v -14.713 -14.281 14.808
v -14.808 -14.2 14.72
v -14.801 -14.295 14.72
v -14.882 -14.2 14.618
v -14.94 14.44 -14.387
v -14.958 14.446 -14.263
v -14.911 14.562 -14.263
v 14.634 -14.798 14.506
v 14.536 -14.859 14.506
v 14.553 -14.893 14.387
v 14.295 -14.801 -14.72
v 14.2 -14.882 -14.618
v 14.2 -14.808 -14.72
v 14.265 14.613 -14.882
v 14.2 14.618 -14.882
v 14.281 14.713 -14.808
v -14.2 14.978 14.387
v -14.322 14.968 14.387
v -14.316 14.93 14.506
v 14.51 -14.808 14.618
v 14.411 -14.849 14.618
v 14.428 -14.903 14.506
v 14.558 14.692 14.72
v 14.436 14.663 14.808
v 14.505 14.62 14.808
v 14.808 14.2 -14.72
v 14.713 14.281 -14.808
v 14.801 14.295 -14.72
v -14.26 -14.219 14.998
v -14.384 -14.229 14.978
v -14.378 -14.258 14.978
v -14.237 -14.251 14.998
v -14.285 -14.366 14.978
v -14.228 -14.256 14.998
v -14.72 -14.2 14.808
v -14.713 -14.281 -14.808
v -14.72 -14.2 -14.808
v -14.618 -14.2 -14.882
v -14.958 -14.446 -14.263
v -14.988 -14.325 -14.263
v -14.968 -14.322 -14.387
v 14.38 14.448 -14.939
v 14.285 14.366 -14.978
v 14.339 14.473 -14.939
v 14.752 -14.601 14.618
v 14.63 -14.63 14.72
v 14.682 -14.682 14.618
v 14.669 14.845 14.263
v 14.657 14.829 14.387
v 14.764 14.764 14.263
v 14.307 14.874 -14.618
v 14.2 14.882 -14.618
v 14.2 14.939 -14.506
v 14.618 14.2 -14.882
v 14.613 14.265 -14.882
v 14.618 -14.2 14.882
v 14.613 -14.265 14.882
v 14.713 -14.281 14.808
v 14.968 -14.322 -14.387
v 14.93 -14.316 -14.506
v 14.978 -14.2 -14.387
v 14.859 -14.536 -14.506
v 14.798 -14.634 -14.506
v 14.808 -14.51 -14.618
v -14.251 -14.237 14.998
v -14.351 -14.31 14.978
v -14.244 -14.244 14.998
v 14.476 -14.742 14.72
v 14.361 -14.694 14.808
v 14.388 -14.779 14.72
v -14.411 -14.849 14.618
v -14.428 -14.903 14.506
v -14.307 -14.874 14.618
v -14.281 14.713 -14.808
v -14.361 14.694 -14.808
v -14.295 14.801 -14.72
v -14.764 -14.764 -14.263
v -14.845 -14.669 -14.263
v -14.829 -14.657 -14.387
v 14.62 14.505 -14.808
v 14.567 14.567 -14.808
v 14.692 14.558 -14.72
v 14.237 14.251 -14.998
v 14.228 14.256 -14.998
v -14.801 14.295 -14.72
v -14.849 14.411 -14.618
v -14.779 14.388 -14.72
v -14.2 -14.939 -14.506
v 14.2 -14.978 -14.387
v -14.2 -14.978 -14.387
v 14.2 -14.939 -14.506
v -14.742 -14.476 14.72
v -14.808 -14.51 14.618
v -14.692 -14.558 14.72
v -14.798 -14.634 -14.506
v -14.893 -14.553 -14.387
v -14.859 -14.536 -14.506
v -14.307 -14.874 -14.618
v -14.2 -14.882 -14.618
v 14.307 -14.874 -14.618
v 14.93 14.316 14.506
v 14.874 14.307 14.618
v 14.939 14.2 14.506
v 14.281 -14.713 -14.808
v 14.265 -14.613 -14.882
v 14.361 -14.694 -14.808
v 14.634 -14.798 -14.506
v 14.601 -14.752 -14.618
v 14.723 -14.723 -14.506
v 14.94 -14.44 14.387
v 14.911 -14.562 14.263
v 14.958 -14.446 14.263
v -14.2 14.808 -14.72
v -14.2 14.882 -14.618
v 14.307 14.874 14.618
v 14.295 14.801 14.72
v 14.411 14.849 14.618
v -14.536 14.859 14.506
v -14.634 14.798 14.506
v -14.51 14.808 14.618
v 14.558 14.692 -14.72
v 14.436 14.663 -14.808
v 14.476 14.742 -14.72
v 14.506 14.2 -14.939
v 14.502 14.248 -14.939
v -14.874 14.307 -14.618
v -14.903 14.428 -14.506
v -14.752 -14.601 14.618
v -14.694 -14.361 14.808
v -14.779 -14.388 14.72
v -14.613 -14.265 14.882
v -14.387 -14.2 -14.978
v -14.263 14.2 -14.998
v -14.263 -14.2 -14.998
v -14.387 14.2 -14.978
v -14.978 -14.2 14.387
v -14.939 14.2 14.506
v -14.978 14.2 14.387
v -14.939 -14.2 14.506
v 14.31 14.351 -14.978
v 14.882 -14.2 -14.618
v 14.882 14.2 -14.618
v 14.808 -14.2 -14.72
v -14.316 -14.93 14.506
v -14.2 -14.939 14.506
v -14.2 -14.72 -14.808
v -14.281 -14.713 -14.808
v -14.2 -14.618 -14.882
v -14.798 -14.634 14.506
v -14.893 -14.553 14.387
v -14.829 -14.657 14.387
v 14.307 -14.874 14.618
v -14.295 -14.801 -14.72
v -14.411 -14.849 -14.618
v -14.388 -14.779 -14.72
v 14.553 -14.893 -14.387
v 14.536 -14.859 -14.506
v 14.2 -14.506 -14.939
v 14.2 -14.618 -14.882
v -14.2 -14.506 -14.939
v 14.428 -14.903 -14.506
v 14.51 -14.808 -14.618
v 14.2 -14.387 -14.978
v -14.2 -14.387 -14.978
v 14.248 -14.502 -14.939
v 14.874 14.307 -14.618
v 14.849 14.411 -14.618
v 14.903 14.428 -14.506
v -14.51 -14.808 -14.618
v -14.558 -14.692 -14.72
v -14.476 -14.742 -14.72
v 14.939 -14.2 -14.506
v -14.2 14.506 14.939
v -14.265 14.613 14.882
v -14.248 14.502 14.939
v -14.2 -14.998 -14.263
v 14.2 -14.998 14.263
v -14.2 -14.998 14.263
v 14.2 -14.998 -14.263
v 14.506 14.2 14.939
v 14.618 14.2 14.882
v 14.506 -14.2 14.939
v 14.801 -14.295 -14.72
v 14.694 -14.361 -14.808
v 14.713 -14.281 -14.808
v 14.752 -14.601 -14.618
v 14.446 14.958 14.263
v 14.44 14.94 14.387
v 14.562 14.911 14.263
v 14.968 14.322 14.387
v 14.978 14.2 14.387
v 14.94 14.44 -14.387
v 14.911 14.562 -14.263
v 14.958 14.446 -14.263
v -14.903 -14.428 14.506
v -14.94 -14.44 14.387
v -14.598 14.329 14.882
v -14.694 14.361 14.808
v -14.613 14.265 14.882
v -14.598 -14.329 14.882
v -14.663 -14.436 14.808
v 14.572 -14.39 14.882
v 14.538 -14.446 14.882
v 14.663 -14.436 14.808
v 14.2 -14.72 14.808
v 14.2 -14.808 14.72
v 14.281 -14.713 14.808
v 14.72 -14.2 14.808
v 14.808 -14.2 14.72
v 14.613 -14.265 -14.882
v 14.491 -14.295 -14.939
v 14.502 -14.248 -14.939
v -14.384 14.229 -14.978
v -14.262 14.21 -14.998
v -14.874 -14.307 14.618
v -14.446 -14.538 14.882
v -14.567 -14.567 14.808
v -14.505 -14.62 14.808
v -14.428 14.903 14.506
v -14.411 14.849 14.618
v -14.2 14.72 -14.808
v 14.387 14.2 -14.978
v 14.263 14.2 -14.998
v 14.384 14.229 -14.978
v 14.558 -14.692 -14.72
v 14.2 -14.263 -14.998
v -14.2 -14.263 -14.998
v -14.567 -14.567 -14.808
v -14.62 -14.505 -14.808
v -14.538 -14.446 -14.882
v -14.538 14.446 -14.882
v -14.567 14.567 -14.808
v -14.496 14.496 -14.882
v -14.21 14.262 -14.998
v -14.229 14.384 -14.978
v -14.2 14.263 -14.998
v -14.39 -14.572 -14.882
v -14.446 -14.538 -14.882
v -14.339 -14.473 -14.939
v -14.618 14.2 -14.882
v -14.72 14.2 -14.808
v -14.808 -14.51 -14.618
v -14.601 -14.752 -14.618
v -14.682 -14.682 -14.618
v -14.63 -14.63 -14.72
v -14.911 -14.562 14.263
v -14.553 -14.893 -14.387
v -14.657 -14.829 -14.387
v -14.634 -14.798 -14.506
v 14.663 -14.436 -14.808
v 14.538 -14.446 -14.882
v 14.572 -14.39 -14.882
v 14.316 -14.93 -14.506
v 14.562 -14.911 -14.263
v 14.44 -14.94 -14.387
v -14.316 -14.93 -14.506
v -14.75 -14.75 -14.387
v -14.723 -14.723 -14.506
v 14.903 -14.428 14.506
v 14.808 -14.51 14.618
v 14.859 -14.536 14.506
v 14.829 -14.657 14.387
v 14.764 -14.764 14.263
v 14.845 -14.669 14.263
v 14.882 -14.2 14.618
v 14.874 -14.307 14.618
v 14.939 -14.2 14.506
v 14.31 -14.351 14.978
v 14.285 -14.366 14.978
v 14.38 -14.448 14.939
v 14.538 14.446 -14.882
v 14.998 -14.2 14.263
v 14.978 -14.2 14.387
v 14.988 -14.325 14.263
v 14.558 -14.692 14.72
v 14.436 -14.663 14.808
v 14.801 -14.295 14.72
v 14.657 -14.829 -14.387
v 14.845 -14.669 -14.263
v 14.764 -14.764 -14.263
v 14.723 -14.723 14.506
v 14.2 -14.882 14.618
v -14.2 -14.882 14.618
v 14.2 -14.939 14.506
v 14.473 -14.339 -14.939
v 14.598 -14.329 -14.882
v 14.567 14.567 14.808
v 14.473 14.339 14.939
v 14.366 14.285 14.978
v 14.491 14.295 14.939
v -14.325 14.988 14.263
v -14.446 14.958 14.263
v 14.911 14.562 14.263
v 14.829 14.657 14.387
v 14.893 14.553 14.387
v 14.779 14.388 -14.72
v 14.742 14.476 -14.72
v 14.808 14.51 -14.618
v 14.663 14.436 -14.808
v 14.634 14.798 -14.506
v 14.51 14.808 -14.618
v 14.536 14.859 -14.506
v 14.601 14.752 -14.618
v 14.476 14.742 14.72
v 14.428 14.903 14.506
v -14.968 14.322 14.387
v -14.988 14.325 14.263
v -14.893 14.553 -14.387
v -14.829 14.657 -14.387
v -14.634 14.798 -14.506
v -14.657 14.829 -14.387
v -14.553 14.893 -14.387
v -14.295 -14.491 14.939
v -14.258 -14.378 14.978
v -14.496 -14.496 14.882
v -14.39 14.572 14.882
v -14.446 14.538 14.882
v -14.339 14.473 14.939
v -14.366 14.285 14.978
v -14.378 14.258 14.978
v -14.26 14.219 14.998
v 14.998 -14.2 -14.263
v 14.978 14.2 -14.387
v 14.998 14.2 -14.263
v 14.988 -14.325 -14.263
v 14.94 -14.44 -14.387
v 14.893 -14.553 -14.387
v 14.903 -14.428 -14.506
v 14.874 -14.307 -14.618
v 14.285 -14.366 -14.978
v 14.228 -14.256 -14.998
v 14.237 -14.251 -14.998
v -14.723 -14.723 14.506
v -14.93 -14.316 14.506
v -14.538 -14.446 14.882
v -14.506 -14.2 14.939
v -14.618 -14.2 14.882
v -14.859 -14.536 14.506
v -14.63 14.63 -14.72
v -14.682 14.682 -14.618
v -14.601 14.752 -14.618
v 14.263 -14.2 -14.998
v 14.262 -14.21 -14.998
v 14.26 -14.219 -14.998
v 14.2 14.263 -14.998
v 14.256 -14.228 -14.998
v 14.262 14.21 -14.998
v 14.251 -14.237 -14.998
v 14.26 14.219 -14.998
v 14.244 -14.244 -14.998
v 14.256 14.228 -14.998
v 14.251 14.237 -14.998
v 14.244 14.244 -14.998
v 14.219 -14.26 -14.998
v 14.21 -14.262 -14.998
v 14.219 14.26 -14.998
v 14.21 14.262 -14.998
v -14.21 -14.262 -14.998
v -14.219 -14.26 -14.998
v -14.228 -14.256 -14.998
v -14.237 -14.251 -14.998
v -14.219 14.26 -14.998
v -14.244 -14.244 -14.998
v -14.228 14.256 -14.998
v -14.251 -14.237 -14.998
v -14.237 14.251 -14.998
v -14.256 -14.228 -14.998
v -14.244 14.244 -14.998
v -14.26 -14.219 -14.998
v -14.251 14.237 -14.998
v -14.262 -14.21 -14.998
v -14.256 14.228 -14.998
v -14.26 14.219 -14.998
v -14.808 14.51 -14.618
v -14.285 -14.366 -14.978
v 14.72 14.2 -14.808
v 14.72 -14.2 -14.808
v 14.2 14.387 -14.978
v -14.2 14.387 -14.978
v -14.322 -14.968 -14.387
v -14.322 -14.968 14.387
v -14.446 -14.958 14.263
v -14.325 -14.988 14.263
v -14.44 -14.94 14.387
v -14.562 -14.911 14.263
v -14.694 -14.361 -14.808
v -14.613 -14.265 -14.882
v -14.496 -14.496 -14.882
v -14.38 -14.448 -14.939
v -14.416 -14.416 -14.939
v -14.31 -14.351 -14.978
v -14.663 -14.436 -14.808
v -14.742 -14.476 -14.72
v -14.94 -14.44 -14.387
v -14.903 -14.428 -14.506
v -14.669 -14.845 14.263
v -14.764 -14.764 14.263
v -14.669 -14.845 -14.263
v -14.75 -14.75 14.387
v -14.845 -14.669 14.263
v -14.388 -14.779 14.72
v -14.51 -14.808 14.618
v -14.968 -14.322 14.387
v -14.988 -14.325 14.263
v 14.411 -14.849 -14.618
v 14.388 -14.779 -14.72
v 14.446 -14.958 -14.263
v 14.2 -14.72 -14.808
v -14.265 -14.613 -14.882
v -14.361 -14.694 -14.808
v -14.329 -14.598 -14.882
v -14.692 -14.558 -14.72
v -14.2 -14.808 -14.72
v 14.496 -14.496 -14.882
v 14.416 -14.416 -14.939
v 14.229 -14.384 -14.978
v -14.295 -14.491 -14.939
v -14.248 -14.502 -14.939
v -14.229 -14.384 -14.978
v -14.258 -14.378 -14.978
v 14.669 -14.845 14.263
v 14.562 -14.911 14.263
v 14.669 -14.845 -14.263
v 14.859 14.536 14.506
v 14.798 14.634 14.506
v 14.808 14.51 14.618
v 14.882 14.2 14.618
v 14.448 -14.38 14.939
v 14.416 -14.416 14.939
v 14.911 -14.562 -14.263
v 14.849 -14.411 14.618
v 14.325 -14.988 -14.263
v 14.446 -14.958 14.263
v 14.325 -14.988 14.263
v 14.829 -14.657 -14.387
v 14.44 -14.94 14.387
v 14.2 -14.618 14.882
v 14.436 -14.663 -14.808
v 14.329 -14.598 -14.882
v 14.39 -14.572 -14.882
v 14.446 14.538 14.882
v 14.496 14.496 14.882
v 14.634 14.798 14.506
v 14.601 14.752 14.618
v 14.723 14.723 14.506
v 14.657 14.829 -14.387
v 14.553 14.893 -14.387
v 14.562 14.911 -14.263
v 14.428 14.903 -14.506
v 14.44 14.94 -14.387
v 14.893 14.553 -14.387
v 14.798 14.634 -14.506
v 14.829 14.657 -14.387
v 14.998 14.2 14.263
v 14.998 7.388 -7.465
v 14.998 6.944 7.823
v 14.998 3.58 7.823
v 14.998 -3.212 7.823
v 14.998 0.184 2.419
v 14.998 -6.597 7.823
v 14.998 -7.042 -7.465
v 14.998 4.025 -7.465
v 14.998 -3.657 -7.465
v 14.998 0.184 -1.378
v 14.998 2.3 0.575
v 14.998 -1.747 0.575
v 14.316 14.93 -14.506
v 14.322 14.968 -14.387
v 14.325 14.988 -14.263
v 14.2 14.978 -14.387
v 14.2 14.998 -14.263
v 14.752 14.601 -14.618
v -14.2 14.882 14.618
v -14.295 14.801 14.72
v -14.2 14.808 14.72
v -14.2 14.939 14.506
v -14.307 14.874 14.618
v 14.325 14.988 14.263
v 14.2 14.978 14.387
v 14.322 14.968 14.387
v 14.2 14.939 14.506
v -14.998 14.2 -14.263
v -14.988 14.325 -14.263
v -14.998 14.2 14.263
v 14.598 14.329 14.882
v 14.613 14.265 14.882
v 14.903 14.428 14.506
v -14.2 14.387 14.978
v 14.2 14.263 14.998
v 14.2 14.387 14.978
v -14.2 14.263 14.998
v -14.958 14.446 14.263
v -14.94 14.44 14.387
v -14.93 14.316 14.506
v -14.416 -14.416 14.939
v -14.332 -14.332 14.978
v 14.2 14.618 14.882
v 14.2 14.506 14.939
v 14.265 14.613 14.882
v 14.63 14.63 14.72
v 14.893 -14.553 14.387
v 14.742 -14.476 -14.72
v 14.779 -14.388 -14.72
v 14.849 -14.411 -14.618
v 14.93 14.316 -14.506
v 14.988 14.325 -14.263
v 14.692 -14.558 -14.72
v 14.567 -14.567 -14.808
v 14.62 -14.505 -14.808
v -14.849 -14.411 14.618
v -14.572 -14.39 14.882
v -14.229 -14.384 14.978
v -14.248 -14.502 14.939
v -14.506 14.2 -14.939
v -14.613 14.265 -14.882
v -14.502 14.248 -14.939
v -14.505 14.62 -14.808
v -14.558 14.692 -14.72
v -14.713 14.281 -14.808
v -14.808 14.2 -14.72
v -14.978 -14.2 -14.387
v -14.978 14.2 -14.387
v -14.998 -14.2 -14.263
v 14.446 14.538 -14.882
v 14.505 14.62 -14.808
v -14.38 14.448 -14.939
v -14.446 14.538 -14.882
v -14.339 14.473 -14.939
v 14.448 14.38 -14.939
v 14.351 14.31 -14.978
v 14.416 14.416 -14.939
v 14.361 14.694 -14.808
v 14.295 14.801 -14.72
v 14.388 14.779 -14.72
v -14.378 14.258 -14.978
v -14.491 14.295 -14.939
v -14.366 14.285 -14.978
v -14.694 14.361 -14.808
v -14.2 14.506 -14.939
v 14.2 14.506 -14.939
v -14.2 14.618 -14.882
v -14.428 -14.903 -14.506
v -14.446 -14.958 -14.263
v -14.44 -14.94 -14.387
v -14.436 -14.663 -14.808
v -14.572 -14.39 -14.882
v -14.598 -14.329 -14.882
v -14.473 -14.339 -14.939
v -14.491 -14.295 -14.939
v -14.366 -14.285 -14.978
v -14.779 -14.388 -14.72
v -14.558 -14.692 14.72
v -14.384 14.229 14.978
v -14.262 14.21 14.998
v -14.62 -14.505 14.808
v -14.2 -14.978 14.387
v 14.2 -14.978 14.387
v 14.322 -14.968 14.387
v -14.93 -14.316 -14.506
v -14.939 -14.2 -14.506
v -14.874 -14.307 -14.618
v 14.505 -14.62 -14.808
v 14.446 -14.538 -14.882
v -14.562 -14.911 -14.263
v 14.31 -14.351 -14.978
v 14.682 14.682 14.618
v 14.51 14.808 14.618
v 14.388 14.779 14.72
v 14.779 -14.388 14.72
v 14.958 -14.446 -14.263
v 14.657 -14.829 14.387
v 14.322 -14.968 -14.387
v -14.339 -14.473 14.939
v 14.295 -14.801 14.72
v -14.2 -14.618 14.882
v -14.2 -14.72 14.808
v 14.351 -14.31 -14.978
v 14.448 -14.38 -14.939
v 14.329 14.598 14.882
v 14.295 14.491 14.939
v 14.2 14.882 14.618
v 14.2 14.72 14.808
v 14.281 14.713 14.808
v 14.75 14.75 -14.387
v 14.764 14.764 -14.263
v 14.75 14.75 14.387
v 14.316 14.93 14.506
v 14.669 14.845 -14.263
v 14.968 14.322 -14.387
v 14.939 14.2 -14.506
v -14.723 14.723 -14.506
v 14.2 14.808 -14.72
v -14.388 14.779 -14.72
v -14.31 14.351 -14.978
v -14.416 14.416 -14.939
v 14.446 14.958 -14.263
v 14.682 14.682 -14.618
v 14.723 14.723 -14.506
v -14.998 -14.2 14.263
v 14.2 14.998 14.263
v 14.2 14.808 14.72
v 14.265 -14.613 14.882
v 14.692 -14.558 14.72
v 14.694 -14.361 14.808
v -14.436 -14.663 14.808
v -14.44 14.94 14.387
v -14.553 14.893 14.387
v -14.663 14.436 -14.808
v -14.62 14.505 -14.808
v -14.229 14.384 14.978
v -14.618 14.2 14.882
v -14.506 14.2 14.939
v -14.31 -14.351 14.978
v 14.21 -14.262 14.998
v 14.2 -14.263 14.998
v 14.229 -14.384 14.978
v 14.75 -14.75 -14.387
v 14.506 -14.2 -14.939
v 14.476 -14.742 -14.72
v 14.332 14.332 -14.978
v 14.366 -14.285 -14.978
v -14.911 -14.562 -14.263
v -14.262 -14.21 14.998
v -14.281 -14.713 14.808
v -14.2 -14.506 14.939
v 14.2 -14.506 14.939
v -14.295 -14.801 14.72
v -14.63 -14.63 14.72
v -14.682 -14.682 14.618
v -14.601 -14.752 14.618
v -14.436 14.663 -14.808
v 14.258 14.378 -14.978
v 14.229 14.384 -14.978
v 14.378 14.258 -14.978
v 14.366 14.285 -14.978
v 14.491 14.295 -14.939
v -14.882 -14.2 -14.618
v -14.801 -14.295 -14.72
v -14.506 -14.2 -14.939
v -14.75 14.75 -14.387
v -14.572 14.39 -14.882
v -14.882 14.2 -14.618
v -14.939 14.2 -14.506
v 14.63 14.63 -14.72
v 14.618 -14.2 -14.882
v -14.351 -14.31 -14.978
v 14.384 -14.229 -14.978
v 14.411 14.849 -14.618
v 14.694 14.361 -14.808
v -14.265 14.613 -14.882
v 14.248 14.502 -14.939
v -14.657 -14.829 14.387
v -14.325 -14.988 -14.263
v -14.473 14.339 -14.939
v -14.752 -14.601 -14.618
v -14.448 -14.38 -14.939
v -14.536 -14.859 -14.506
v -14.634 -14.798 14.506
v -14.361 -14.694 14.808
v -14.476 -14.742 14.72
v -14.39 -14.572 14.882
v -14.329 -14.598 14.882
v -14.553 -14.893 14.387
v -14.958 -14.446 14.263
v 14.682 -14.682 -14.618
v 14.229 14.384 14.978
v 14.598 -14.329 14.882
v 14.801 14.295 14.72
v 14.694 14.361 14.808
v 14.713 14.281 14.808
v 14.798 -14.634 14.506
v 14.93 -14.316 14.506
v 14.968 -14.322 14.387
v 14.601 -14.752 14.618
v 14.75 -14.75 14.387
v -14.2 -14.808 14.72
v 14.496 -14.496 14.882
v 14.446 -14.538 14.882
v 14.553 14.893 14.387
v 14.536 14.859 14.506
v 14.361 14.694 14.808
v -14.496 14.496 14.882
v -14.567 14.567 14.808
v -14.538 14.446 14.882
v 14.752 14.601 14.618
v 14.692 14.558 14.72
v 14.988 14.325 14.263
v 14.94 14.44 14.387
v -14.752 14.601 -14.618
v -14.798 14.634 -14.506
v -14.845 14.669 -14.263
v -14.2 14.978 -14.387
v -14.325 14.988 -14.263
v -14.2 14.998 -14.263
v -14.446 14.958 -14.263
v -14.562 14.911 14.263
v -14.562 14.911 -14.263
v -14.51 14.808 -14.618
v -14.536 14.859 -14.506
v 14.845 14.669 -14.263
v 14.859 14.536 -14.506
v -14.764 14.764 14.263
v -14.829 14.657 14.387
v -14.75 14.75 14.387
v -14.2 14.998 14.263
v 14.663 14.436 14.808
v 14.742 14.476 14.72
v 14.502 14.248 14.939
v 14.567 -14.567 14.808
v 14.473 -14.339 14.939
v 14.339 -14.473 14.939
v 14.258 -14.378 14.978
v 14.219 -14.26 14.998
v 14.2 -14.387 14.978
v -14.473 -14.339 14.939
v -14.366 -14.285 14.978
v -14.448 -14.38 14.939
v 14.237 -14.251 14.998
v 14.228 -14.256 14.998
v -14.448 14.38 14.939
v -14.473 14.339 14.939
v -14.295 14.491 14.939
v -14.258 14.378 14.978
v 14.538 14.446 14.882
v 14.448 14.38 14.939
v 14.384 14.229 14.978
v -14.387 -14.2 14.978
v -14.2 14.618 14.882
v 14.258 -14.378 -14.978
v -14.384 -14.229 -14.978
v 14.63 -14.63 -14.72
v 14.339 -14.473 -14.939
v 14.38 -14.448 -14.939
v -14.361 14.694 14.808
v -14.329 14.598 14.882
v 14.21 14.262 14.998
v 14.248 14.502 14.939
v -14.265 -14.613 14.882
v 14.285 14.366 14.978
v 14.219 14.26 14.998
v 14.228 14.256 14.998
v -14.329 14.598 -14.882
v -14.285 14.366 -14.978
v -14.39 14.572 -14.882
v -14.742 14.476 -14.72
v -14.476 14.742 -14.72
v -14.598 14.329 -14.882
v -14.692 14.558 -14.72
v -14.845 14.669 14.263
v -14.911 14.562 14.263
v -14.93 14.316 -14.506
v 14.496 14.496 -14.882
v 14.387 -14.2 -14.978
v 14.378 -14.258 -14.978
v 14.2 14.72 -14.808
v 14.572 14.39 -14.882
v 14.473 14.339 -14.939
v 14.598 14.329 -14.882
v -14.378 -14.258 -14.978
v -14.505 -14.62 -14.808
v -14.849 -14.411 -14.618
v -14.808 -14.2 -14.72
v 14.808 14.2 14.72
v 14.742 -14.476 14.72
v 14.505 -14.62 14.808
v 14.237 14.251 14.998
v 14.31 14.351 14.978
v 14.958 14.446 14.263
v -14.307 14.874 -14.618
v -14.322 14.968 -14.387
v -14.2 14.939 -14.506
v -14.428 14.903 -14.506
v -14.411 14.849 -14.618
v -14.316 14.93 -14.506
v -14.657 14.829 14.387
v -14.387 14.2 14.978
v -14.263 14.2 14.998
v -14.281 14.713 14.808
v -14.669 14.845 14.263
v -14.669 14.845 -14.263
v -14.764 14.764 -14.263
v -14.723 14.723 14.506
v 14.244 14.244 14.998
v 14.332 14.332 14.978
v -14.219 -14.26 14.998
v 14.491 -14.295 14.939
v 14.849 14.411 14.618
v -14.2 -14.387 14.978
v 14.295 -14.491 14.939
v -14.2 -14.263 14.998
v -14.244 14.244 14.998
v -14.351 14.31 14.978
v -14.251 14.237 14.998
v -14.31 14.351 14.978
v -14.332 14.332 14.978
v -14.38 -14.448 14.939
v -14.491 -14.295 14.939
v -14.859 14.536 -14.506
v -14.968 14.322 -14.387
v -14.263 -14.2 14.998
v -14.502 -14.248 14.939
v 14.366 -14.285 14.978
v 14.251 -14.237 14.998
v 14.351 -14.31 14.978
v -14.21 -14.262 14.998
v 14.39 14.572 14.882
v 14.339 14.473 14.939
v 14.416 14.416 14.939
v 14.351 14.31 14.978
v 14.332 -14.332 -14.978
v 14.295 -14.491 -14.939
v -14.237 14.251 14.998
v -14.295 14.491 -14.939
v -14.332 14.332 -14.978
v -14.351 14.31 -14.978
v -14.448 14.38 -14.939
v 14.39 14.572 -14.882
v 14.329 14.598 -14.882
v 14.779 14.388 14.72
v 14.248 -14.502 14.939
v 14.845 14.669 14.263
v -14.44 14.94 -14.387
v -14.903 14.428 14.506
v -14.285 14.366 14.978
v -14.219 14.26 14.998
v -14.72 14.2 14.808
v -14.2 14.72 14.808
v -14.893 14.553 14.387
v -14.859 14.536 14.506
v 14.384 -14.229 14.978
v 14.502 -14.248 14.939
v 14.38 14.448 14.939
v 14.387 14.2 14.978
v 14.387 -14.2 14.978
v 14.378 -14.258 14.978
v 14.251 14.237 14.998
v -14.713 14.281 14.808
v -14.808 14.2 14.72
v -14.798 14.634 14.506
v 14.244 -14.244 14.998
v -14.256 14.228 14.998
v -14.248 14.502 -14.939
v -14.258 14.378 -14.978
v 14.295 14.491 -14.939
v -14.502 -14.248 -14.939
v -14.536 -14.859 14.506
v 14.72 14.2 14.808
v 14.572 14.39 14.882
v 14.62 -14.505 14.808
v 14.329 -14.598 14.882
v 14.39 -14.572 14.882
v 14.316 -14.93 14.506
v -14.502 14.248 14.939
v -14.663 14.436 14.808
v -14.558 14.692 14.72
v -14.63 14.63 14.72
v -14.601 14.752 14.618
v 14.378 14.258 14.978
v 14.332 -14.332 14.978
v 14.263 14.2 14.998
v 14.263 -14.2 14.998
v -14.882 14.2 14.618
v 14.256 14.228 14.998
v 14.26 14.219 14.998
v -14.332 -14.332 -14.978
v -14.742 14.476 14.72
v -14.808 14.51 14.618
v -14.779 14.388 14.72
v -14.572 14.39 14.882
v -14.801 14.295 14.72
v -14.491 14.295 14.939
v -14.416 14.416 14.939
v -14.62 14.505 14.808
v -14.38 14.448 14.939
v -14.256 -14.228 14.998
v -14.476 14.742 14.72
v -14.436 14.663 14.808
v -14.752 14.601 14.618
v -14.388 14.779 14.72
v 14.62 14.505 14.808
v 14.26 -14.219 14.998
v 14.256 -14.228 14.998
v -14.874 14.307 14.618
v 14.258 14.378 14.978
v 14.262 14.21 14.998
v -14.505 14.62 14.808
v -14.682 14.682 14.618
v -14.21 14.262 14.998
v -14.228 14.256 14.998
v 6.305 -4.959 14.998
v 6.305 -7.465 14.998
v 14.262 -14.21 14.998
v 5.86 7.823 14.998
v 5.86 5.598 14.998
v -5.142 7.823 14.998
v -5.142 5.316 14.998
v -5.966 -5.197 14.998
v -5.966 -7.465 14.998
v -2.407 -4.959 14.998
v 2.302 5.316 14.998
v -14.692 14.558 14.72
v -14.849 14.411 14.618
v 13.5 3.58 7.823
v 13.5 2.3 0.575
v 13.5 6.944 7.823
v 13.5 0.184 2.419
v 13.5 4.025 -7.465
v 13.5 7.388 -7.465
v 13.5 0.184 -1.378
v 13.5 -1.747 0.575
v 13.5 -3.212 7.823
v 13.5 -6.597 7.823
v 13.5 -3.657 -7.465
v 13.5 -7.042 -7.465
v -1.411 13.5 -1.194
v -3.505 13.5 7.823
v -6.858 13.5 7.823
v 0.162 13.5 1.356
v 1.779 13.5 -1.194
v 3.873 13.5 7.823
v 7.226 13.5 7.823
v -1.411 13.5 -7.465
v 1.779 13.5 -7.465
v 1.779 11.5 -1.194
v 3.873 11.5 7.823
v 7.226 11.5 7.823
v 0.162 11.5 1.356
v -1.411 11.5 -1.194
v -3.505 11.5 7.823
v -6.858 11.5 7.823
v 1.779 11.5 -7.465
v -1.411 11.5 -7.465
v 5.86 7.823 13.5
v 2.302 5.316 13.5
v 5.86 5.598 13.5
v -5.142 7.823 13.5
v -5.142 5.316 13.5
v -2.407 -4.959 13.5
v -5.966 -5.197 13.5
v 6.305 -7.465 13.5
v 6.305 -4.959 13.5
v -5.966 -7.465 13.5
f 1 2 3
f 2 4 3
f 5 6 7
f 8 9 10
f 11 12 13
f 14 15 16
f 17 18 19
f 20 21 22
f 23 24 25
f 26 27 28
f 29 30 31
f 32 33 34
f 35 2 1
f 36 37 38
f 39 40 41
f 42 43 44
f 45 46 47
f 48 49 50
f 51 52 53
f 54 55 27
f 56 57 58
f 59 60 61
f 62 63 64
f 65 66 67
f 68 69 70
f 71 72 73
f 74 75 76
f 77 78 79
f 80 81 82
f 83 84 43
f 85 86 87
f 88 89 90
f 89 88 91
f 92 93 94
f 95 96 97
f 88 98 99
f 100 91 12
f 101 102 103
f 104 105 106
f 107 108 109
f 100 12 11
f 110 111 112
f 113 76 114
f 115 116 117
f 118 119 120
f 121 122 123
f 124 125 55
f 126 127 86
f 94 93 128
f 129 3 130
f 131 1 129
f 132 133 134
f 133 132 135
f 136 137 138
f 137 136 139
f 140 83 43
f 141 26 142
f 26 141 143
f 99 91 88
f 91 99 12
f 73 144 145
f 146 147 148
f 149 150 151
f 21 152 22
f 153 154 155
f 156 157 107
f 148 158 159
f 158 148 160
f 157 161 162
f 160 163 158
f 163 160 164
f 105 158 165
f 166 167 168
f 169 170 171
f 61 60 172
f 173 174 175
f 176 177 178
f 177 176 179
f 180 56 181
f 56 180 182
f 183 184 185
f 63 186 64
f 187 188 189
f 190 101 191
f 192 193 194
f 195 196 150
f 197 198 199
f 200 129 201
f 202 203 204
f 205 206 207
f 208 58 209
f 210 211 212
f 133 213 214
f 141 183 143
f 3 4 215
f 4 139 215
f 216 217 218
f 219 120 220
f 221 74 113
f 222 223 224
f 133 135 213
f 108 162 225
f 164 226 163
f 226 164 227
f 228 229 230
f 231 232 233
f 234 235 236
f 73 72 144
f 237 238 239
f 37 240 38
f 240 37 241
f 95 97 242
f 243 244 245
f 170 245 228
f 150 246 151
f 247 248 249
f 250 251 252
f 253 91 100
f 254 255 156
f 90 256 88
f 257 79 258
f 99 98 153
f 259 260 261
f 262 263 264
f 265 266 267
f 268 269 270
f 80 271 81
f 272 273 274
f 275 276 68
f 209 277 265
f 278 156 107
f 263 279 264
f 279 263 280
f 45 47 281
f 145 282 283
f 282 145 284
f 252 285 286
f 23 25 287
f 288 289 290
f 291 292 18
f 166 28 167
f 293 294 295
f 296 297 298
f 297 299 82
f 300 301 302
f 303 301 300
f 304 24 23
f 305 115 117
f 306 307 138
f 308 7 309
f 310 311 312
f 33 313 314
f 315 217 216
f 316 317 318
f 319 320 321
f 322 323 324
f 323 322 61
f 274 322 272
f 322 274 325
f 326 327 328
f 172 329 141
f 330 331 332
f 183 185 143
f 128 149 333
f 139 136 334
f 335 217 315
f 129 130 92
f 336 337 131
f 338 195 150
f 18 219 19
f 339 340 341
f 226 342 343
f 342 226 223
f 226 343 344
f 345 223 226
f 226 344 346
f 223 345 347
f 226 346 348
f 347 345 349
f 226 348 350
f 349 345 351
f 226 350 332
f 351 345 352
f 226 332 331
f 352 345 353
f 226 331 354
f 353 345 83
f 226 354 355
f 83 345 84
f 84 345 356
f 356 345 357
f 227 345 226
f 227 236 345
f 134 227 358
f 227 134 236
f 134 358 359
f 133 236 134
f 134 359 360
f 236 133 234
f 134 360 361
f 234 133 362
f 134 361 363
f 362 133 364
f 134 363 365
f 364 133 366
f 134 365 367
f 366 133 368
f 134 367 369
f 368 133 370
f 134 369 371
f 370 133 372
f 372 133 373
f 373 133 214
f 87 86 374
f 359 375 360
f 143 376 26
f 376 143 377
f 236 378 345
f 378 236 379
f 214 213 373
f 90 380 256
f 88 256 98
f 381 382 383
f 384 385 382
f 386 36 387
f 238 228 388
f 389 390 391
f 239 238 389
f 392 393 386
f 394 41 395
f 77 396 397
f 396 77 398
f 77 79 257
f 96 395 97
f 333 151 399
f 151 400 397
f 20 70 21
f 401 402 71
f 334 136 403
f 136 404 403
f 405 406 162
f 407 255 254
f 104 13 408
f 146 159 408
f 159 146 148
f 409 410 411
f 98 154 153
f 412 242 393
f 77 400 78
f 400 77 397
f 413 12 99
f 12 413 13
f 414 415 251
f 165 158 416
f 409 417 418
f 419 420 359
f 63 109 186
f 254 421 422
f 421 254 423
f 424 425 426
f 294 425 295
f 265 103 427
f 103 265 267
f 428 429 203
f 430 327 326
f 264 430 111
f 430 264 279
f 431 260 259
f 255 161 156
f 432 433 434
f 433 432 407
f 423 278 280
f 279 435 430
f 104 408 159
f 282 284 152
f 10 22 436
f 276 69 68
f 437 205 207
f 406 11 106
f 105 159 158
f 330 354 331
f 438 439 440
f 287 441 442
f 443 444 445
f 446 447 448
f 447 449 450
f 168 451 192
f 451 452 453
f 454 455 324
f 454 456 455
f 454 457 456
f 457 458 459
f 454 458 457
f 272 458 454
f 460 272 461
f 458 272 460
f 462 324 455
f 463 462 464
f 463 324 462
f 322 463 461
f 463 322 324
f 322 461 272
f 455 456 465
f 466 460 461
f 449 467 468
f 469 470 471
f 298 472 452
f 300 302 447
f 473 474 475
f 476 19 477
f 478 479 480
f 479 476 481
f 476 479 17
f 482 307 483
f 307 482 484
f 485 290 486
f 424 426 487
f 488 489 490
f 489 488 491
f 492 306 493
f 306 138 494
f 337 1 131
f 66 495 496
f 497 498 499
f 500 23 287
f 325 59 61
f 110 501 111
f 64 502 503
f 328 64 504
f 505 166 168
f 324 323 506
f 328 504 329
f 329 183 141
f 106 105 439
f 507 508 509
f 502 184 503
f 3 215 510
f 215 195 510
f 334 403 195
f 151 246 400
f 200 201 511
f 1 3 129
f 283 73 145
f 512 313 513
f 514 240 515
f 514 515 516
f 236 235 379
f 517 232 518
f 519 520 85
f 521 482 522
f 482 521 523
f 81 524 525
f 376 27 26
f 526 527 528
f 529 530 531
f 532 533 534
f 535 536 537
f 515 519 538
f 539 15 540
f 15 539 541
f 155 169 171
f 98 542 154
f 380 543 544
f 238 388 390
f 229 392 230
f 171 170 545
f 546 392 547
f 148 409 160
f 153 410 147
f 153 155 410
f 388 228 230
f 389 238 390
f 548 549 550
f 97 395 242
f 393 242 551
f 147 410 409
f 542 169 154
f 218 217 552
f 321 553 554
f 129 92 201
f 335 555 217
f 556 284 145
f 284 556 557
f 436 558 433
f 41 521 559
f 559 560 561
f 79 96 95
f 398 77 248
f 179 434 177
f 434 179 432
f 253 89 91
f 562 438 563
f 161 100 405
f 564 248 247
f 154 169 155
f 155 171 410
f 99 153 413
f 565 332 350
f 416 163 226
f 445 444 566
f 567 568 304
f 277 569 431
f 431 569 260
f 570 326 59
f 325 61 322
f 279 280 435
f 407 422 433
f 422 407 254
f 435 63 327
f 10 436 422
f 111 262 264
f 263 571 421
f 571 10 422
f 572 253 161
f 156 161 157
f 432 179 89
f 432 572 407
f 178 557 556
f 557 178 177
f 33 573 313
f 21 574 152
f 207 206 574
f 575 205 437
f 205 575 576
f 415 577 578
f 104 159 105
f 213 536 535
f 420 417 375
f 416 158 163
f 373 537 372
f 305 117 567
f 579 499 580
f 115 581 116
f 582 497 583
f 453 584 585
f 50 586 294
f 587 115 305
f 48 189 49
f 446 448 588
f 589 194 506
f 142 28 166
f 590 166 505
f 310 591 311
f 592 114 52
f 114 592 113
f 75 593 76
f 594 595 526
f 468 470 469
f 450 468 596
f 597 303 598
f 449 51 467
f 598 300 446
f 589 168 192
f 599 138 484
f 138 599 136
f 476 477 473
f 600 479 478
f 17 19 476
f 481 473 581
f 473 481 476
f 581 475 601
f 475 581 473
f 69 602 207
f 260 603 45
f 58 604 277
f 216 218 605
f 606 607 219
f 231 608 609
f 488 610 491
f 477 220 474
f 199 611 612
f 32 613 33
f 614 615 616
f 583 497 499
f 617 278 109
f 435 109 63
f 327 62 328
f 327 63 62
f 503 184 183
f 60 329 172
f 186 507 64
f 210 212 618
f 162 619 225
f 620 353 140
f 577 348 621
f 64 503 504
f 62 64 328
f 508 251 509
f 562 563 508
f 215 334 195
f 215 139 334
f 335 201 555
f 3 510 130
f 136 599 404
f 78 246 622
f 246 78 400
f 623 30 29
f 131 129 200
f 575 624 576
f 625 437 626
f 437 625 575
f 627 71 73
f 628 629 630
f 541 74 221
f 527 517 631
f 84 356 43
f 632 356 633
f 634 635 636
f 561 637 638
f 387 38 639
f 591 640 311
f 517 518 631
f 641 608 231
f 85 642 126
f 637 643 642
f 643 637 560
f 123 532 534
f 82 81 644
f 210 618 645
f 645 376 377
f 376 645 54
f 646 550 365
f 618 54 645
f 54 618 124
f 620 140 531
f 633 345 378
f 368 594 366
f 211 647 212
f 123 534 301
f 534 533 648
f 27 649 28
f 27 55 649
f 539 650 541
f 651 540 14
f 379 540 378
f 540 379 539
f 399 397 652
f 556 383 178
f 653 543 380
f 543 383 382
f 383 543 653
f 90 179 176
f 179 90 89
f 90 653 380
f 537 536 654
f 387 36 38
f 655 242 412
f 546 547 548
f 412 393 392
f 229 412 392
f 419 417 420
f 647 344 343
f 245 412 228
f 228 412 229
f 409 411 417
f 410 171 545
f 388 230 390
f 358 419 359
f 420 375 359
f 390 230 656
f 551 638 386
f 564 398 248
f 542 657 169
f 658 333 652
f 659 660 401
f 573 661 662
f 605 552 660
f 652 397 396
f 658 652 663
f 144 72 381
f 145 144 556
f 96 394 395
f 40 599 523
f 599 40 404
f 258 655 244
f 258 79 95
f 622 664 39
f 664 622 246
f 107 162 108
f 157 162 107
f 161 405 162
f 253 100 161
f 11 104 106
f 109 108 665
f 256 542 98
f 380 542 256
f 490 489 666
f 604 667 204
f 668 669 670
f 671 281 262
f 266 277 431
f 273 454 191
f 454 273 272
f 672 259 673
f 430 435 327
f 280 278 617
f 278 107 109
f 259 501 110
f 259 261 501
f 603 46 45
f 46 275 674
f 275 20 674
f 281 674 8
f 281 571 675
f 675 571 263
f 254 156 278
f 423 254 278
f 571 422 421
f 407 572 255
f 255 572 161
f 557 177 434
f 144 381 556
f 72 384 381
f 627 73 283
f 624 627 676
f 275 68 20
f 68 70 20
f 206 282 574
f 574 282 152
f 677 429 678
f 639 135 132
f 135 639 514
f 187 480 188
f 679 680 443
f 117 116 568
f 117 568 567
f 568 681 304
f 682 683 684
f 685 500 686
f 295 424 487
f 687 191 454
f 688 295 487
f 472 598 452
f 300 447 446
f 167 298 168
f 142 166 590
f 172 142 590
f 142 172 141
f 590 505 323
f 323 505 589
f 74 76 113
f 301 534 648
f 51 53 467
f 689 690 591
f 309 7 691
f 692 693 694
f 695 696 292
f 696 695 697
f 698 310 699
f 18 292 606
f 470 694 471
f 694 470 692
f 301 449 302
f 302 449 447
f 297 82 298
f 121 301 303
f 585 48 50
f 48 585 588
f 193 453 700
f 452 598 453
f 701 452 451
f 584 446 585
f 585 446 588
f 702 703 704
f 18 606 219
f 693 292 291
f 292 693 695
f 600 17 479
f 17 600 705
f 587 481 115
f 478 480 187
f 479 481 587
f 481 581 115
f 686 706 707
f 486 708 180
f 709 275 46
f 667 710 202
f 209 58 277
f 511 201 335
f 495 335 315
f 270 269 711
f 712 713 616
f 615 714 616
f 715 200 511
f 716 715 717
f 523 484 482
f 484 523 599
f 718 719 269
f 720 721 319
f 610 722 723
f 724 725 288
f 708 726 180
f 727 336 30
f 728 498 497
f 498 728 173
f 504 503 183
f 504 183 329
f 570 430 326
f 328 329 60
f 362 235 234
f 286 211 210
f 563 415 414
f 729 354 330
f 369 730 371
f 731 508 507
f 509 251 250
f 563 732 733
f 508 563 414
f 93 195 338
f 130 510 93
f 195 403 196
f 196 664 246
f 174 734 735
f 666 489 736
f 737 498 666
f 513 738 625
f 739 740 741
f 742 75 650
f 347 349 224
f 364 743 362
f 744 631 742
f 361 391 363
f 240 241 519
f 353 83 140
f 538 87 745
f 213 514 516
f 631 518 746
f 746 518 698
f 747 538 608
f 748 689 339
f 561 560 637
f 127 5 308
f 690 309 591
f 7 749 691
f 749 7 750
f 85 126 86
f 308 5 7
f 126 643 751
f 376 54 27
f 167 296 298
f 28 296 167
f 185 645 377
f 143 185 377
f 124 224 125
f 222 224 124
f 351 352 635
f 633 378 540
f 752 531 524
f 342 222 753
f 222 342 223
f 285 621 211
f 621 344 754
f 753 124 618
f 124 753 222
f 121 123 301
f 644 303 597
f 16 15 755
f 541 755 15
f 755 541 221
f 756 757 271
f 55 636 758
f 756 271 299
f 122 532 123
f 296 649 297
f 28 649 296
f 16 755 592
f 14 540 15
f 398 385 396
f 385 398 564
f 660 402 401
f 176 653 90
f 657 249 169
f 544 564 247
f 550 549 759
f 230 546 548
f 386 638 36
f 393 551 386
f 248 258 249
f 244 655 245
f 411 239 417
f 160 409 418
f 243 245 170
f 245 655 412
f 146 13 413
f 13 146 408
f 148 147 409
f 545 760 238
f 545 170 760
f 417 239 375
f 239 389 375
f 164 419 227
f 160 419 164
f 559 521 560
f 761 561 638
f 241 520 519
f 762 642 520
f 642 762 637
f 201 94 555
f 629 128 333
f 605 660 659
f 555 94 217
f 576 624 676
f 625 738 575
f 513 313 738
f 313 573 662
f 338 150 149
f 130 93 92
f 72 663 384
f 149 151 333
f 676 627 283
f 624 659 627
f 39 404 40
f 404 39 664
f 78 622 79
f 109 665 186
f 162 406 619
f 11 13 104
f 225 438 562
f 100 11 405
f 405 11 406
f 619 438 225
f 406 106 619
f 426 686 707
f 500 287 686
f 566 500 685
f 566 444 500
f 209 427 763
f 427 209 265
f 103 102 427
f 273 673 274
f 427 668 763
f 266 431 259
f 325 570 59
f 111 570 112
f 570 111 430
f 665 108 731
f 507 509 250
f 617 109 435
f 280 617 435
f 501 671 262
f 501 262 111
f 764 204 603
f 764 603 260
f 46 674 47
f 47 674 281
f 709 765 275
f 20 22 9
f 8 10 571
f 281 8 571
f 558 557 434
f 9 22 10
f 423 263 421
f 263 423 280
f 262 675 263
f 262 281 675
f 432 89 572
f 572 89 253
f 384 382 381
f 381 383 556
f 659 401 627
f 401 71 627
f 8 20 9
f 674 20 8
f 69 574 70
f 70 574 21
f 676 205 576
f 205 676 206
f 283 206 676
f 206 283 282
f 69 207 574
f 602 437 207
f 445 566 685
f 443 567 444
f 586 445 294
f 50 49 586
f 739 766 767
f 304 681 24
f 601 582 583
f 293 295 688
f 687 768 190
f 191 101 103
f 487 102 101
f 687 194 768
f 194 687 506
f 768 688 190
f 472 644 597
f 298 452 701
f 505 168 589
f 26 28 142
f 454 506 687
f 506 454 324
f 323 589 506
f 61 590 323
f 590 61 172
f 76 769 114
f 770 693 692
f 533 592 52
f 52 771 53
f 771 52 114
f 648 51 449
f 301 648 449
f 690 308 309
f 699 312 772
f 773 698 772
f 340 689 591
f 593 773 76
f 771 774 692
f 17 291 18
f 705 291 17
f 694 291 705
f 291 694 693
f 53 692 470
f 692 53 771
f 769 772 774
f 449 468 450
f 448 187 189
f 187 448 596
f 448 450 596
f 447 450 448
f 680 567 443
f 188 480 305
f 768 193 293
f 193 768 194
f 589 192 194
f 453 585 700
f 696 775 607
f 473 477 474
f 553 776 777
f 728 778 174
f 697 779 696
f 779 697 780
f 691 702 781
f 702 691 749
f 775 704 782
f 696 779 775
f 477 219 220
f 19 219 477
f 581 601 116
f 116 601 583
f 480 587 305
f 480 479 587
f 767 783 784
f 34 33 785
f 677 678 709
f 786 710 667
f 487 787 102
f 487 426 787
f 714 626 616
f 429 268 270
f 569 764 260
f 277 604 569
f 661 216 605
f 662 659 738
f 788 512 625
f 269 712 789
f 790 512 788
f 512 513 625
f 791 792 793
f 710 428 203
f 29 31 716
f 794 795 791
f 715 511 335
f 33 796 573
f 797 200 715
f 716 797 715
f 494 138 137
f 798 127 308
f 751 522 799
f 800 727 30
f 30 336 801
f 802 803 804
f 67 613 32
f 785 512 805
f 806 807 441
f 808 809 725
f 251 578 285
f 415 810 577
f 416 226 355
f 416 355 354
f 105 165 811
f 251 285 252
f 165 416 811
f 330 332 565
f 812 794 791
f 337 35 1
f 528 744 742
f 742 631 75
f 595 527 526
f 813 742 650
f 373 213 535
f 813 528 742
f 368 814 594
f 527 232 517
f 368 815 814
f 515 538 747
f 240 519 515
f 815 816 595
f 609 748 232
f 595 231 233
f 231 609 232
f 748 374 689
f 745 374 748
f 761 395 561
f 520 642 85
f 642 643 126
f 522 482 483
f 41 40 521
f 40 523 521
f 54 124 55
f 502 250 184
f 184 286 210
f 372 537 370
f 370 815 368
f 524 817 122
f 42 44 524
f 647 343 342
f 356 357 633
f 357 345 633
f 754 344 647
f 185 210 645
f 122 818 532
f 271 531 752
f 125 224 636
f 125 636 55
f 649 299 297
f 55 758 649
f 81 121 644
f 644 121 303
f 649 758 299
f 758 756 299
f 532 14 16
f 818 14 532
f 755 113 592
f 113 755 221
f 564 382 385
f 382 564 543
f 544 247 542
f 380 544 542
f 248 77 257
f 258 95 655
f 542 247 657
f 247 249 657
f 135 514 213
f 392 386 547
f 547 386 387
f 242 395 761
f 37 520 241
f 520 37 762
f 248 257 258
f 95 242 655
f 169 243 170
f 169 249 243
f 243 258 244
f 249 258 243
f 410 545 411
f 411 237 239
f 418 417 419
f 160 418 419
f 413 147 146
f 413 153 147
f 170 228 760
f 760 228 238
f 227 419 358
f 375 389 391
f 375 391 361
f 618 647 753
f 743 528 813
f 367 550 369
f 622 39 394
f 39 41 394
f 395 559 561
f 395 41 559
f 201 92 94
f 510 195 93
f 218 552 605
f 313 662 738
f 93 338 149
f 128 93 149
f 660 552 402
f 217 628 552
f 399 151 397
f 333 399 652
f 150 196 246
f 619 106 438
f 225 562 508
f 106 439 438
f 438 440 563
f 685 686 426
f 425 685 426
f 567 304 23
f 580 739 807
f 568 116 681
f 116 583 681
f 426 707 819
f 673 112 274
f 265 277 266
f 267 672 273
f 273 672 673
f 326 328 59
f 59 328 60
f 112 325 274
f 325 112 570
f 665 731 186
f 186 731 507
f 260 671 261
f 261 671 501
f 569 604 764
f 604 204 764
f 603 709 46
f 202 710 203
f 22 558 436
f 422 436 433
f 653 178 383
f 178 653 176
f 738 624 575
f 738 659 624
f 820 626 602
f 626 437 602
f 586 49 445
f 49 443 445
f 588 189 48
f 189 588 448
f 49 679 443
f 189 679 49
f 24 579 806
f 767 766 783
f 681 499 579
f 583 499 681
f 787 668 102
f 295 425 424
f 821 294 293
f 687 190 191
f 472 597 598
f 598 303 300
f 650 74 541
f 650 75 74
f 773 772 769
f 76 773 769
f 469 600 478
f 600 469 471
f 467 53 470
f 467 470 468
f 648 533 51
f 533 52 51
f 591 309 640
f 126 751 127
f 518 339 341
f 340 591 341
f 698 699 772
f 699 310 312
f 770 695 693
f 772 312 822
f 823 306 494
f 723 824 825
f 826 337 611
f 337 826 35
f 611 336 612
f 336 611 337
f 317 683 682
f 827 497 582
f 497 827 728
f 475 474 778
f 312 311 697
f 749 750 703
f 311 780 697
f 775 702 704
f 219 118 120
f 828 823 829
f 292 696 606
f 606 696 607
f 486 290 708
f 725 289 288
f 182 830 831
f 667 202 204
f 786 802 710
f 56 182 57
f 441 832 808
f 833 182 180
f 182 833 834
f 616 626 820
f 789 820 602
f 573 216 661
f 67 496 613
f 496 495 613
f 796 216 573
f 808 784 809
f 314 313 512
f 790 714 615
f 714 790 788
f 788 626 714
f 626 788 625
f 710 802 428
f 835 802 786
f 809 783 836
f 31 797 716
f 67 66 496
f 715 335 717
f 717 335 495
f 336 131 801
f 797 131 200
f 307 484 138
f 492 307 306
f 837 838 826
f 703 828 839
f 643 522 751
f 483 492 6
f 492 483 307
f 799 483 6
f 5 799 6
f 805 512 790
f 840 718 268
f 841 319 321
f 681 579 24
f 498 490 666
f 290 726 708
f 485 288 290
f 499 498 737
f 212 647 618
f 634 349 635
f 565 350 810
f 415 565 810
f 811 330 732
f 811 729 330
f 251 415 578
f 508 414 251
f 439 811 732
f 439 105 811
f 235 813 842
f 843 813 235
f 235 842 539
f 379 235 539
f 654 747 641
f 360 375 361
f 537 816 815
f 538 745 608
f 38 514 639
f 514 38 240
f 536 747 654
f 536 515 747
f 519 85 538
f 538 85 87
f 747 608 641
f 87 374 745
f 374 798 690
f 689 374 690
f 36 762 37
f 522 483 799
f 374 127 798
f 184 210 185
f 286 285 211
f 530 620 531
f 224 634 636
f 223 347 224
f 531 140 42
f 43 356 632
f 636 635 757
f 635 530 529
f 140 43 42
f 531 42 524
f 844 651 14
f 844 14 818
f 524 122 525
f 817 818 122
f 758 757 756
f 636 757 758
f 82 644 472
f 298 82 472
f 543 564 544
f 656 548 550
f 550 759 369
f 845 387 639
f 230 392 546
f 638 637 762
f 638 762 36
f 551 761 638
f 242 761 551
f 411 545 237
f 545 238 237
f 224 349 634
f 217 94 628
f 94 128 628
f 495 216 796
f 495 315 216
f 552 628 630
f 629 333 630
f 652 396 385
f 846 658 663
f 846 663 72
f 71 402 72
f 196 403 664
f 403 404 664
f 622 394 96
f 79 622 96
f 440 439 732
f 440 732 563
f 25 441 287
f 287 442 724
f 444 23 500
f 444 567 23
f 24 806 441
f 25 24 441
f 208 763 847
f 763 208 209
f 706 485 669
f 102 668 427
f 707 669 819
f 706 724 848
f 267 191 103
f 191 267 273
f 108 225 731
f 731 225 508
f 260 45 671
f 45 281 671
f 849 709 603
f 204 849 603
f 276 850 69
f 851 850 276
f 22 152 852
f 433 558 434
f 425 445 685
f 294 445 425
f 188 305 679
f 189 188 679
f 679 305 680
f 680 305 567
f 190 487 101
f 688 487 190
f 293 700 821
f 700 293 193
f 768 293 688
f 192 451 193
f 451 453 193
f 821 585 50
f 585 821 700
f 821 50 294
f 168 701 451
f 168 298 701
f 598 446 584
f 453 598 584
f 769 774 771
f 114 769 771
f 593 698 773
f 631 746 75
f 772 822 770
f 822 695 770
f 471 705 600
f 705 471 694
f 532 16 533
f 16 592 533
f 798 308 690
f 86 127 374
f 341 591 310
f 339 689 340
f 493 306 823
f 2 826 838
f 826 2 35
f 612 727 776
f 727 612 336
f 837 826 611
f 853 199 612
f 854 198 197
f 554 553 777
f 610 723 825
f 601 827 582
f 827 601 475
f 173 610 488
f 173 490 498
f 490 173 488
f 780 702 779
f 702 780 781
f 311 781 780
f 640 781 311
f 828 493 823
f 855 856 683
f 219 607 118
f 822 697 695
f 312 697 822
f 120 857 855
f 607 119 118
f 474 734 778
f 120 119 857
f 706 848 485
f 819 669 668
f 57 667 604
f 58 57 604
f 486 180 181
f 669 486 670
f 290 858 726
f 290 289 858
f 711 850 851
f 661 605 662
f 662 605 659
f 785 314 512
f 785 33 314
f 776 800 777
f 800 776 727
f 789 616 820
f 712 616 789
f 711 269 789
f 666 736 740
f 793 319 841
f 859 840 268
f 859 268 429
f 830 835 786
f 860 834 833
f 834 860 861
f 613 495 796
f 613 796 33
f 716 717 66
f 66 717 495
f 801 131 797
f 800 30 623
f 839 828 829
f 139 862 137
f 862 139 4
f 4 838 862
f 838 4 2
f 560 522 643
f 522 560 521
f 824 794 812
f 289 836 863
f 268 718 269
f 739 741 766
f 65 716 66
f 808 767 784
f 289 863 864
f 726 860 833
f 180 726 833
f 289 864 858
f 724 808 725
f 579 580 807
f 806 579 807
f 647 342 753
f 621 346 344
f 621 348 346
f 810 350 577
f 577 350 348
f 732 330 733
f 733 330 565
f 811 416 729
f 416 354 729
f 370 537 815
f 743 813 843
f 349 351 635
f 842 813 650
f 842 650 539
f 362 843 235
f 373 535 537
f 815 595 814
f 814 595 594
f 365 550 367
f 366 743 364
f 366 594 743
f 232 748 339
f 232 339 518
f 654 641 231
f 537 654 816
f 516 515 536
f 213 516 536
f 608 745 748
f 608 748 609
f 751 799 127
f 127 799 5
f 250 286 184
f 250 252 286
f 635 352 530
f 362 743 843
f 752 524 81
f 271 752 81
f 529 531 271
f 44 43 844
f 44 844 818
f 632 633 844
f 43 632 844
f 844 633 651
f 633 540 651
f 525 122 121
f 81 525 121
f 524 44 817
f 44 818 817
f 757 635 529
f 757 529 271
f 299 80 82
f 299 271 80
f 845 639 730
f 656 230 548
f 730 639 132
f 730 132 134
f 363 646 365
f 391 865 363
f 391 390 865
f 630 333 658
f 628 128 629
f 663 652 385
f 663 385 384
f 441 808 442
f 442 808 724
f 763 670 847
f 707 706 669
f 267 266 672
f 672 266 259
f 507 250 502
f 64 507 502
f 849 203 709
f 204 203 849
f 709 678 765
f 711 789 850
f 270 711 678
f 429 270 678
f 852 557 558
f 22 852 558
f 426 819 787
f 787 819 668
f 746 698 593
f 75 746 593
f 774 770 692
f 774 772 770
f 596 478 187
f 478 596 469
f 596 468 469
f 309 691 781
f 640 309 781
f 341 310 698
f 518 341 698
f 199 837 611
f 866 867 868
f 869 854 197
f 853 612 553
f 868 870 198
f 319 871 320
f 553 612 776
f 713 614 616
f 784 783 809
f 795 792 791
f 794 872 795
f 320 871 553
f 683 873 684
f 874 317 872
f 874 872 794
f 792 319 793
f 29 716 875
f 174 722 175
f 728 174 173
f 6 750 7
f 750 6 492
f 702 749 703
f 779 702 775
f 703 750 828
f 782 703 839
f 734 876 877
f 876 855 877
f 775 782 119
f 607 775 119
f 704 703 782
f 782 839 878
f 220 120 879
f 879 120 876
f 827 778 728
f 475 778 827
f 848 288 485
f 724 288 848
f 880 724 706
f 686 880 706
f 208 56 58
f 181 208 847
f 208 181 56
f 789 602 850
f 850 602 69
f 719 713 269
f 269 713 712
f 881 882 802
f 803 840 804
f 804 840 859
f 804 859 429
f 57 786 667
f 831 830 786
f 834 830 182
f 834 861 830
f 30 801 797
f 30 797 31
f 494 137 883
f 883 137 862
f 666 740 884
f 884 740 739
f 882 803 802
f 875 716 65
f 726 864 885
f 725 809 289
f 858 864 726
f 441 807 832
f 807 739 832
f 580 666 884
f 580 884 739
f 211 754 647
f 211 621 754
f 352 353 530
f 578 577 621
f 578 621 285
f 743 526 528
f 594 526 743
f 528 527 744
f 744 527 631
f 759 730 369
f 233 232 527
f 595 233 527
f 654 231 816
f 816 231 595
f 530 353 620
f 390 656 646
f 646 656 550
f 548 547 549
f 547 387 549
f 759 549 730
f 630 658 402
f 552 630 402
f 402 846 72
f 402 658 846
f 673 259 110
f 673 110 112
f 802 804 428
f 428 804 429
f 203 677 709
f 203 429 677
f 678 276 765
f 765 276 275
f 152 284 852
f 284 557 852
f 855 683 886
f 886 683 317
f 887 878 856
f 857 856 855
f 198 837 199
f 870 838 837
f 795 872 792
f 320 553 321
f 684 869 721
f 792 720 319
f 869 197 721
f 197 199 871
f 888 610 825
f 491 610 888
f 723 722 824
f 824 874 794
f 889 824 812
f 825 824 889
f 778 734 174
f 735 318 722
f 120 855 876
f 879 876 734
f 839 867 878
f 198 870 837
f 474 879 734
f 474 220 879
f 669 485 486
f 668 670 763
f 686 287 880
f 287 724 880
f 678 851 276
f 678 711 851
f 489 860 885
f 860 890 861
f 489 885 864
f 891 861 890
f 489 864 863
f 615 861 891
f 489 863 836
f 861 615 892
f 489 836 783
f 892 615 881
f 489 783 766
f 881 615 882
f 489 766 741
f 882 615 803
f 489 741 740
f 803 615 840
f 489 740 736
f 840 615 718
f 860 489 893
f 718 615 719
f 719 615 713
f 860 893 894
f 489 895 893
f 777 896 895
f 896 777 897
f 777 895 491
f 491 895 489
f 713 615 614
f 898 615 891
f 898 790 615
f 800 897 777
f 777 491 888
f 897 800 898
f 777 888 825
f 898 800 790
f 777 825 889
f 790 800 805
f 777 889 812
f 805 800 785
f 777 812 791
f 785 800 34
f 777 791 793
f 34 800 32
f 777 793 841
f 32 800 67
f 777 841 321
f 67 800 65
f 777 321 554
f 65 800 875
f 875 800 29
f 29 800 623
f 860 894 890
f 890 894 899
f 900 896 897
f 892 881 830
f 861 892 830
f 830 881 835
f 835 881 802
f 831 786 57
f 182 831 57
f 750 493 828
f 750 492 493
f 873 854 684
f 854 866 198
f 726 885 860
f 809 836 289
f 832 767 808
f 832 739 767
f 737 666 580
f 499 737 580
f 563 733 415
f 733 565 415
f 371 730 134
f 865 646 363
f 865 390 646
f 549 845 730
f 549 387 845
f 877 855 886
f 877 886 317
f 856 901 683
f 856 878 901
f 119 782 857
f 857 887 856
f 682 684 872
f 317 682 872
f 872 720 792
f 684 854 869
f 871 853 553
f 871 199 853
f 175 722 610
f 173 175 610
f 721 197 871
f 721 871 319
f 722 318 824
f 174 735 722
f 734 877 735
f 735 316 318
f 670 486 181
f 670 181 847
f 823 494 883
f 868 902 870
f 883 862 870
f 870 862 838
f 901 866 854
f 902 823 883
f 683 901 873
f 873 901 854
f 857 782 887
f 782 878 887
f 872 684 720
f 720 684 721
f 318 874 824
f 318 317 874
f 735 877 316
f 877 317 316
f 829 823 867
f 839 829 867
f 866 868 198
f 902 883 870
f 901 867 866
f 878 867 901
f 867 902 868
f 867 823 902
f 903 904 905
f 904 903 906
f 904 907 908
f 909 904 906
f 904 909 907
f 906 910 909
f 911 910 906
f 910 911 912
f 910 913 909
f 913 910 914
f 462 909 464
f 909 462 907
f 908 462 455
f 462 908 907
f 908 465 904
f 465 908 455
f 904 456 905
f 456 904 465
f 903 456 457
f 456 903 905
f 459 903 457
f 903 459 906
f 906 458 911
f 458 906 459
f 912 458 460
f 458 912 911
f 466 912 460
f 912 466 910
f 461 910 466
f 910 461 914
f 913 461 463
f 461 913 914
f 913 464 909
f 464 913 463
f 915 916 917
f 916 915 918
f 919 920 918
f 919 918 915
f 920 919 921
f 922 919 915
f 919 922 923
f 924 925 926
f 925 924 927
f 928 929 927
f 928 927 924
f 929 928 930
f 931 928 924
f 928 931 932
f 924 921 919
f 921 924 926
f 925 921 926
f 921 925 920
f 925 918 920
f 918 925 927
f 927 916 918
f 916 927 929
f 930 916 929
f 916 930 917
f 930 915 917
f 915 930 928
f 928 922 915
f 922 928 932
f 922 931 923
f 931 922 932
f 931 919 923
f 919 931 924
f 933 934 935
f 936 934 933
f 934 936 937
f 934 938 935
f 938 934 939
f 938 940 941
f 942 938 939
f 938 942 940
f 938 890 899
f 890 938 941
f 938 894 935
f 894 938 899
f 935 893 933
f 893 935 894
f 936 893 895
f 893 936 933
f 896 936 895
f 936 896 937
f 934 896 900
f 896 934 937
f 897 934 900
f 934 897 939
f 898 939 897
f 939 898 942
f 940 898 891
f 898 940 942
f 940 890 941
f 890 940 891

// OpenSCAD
// file: ../lib/test-cube-xyz-lib.scad
// XYZ test cube — small calibration/diagnostic cube with the letters X, Y,
// and Z engraved on the +X, +Y, and +Z faces respectively. Great for a
// first slice-and-print sanity check because you can immediately verify the
// printer's coordinate system by looking at which face landed where.

// BEGIN_PARAMS
// Outer edge length of the cube (mm).
cube_size = 30;

// Engraving depth (mm) — how deep the letters cut into the cube face.
letter_depth = 1.5;

// Font size for the letters (mm).
letter_size = 16;

// Optional chamfer on top+bottom edges (mm). Set to 0 for a hard cube.
edge_chamfer = 0.8;
// END_PARAMS

$fn = 40;

module _cube_with_chamfer() {
  if (edge_chamfer <= 0) {
    cube(cube_size, center = true);
  } else {
    minkowski() {
      cube(cube_size - 2 * edge_chamfer, center = true);
      sphere(r = edge_chamfer);
    }
  }
}

module _letter(char, face_offset, rot) {
  // linear_extrude a bit deeper than letter_depth so the boolean cleanly
  // exits the far face and doesn't leave a paper-thin skin.
  translate(face_offset)
    rotate(rot)
      linear_extrude(height = letter_depth + 0.5, center = false)
        text(char,
             size = letter_size,
             halign = "center",
             valign = "center",
             font = "Liberation Sans:style=Bold");
}

module test_cube_xyz() {
  difference() {
    _cube_with_chamfer();

    // X on the +X face — extrude along Z, then rotate so the extrusion axis
    // ends up pointing along +X.
    _letter("X",
            [cube_size / 2 - letter_depth, 0, 0],
            [90, 0, 90]);

    // Y on the +Y face — rotate so extrusion axis ends up along +Y.
    _letter("Y",
            [0, cube_size / 2 - letter_depth, 0],
            [90, 0, 0]);

    // Z on the +Z face — no rotation needed, native linear_extrude direction.
    _letter("Z",
            [0, 0, cube_size / 2 - letter_depth],
            [0, 0, 0]);
  }
}
// main file
include <../lib/test-cube-xyz-lib.scad>;
$fn = 40;
test_cube_xyz();
